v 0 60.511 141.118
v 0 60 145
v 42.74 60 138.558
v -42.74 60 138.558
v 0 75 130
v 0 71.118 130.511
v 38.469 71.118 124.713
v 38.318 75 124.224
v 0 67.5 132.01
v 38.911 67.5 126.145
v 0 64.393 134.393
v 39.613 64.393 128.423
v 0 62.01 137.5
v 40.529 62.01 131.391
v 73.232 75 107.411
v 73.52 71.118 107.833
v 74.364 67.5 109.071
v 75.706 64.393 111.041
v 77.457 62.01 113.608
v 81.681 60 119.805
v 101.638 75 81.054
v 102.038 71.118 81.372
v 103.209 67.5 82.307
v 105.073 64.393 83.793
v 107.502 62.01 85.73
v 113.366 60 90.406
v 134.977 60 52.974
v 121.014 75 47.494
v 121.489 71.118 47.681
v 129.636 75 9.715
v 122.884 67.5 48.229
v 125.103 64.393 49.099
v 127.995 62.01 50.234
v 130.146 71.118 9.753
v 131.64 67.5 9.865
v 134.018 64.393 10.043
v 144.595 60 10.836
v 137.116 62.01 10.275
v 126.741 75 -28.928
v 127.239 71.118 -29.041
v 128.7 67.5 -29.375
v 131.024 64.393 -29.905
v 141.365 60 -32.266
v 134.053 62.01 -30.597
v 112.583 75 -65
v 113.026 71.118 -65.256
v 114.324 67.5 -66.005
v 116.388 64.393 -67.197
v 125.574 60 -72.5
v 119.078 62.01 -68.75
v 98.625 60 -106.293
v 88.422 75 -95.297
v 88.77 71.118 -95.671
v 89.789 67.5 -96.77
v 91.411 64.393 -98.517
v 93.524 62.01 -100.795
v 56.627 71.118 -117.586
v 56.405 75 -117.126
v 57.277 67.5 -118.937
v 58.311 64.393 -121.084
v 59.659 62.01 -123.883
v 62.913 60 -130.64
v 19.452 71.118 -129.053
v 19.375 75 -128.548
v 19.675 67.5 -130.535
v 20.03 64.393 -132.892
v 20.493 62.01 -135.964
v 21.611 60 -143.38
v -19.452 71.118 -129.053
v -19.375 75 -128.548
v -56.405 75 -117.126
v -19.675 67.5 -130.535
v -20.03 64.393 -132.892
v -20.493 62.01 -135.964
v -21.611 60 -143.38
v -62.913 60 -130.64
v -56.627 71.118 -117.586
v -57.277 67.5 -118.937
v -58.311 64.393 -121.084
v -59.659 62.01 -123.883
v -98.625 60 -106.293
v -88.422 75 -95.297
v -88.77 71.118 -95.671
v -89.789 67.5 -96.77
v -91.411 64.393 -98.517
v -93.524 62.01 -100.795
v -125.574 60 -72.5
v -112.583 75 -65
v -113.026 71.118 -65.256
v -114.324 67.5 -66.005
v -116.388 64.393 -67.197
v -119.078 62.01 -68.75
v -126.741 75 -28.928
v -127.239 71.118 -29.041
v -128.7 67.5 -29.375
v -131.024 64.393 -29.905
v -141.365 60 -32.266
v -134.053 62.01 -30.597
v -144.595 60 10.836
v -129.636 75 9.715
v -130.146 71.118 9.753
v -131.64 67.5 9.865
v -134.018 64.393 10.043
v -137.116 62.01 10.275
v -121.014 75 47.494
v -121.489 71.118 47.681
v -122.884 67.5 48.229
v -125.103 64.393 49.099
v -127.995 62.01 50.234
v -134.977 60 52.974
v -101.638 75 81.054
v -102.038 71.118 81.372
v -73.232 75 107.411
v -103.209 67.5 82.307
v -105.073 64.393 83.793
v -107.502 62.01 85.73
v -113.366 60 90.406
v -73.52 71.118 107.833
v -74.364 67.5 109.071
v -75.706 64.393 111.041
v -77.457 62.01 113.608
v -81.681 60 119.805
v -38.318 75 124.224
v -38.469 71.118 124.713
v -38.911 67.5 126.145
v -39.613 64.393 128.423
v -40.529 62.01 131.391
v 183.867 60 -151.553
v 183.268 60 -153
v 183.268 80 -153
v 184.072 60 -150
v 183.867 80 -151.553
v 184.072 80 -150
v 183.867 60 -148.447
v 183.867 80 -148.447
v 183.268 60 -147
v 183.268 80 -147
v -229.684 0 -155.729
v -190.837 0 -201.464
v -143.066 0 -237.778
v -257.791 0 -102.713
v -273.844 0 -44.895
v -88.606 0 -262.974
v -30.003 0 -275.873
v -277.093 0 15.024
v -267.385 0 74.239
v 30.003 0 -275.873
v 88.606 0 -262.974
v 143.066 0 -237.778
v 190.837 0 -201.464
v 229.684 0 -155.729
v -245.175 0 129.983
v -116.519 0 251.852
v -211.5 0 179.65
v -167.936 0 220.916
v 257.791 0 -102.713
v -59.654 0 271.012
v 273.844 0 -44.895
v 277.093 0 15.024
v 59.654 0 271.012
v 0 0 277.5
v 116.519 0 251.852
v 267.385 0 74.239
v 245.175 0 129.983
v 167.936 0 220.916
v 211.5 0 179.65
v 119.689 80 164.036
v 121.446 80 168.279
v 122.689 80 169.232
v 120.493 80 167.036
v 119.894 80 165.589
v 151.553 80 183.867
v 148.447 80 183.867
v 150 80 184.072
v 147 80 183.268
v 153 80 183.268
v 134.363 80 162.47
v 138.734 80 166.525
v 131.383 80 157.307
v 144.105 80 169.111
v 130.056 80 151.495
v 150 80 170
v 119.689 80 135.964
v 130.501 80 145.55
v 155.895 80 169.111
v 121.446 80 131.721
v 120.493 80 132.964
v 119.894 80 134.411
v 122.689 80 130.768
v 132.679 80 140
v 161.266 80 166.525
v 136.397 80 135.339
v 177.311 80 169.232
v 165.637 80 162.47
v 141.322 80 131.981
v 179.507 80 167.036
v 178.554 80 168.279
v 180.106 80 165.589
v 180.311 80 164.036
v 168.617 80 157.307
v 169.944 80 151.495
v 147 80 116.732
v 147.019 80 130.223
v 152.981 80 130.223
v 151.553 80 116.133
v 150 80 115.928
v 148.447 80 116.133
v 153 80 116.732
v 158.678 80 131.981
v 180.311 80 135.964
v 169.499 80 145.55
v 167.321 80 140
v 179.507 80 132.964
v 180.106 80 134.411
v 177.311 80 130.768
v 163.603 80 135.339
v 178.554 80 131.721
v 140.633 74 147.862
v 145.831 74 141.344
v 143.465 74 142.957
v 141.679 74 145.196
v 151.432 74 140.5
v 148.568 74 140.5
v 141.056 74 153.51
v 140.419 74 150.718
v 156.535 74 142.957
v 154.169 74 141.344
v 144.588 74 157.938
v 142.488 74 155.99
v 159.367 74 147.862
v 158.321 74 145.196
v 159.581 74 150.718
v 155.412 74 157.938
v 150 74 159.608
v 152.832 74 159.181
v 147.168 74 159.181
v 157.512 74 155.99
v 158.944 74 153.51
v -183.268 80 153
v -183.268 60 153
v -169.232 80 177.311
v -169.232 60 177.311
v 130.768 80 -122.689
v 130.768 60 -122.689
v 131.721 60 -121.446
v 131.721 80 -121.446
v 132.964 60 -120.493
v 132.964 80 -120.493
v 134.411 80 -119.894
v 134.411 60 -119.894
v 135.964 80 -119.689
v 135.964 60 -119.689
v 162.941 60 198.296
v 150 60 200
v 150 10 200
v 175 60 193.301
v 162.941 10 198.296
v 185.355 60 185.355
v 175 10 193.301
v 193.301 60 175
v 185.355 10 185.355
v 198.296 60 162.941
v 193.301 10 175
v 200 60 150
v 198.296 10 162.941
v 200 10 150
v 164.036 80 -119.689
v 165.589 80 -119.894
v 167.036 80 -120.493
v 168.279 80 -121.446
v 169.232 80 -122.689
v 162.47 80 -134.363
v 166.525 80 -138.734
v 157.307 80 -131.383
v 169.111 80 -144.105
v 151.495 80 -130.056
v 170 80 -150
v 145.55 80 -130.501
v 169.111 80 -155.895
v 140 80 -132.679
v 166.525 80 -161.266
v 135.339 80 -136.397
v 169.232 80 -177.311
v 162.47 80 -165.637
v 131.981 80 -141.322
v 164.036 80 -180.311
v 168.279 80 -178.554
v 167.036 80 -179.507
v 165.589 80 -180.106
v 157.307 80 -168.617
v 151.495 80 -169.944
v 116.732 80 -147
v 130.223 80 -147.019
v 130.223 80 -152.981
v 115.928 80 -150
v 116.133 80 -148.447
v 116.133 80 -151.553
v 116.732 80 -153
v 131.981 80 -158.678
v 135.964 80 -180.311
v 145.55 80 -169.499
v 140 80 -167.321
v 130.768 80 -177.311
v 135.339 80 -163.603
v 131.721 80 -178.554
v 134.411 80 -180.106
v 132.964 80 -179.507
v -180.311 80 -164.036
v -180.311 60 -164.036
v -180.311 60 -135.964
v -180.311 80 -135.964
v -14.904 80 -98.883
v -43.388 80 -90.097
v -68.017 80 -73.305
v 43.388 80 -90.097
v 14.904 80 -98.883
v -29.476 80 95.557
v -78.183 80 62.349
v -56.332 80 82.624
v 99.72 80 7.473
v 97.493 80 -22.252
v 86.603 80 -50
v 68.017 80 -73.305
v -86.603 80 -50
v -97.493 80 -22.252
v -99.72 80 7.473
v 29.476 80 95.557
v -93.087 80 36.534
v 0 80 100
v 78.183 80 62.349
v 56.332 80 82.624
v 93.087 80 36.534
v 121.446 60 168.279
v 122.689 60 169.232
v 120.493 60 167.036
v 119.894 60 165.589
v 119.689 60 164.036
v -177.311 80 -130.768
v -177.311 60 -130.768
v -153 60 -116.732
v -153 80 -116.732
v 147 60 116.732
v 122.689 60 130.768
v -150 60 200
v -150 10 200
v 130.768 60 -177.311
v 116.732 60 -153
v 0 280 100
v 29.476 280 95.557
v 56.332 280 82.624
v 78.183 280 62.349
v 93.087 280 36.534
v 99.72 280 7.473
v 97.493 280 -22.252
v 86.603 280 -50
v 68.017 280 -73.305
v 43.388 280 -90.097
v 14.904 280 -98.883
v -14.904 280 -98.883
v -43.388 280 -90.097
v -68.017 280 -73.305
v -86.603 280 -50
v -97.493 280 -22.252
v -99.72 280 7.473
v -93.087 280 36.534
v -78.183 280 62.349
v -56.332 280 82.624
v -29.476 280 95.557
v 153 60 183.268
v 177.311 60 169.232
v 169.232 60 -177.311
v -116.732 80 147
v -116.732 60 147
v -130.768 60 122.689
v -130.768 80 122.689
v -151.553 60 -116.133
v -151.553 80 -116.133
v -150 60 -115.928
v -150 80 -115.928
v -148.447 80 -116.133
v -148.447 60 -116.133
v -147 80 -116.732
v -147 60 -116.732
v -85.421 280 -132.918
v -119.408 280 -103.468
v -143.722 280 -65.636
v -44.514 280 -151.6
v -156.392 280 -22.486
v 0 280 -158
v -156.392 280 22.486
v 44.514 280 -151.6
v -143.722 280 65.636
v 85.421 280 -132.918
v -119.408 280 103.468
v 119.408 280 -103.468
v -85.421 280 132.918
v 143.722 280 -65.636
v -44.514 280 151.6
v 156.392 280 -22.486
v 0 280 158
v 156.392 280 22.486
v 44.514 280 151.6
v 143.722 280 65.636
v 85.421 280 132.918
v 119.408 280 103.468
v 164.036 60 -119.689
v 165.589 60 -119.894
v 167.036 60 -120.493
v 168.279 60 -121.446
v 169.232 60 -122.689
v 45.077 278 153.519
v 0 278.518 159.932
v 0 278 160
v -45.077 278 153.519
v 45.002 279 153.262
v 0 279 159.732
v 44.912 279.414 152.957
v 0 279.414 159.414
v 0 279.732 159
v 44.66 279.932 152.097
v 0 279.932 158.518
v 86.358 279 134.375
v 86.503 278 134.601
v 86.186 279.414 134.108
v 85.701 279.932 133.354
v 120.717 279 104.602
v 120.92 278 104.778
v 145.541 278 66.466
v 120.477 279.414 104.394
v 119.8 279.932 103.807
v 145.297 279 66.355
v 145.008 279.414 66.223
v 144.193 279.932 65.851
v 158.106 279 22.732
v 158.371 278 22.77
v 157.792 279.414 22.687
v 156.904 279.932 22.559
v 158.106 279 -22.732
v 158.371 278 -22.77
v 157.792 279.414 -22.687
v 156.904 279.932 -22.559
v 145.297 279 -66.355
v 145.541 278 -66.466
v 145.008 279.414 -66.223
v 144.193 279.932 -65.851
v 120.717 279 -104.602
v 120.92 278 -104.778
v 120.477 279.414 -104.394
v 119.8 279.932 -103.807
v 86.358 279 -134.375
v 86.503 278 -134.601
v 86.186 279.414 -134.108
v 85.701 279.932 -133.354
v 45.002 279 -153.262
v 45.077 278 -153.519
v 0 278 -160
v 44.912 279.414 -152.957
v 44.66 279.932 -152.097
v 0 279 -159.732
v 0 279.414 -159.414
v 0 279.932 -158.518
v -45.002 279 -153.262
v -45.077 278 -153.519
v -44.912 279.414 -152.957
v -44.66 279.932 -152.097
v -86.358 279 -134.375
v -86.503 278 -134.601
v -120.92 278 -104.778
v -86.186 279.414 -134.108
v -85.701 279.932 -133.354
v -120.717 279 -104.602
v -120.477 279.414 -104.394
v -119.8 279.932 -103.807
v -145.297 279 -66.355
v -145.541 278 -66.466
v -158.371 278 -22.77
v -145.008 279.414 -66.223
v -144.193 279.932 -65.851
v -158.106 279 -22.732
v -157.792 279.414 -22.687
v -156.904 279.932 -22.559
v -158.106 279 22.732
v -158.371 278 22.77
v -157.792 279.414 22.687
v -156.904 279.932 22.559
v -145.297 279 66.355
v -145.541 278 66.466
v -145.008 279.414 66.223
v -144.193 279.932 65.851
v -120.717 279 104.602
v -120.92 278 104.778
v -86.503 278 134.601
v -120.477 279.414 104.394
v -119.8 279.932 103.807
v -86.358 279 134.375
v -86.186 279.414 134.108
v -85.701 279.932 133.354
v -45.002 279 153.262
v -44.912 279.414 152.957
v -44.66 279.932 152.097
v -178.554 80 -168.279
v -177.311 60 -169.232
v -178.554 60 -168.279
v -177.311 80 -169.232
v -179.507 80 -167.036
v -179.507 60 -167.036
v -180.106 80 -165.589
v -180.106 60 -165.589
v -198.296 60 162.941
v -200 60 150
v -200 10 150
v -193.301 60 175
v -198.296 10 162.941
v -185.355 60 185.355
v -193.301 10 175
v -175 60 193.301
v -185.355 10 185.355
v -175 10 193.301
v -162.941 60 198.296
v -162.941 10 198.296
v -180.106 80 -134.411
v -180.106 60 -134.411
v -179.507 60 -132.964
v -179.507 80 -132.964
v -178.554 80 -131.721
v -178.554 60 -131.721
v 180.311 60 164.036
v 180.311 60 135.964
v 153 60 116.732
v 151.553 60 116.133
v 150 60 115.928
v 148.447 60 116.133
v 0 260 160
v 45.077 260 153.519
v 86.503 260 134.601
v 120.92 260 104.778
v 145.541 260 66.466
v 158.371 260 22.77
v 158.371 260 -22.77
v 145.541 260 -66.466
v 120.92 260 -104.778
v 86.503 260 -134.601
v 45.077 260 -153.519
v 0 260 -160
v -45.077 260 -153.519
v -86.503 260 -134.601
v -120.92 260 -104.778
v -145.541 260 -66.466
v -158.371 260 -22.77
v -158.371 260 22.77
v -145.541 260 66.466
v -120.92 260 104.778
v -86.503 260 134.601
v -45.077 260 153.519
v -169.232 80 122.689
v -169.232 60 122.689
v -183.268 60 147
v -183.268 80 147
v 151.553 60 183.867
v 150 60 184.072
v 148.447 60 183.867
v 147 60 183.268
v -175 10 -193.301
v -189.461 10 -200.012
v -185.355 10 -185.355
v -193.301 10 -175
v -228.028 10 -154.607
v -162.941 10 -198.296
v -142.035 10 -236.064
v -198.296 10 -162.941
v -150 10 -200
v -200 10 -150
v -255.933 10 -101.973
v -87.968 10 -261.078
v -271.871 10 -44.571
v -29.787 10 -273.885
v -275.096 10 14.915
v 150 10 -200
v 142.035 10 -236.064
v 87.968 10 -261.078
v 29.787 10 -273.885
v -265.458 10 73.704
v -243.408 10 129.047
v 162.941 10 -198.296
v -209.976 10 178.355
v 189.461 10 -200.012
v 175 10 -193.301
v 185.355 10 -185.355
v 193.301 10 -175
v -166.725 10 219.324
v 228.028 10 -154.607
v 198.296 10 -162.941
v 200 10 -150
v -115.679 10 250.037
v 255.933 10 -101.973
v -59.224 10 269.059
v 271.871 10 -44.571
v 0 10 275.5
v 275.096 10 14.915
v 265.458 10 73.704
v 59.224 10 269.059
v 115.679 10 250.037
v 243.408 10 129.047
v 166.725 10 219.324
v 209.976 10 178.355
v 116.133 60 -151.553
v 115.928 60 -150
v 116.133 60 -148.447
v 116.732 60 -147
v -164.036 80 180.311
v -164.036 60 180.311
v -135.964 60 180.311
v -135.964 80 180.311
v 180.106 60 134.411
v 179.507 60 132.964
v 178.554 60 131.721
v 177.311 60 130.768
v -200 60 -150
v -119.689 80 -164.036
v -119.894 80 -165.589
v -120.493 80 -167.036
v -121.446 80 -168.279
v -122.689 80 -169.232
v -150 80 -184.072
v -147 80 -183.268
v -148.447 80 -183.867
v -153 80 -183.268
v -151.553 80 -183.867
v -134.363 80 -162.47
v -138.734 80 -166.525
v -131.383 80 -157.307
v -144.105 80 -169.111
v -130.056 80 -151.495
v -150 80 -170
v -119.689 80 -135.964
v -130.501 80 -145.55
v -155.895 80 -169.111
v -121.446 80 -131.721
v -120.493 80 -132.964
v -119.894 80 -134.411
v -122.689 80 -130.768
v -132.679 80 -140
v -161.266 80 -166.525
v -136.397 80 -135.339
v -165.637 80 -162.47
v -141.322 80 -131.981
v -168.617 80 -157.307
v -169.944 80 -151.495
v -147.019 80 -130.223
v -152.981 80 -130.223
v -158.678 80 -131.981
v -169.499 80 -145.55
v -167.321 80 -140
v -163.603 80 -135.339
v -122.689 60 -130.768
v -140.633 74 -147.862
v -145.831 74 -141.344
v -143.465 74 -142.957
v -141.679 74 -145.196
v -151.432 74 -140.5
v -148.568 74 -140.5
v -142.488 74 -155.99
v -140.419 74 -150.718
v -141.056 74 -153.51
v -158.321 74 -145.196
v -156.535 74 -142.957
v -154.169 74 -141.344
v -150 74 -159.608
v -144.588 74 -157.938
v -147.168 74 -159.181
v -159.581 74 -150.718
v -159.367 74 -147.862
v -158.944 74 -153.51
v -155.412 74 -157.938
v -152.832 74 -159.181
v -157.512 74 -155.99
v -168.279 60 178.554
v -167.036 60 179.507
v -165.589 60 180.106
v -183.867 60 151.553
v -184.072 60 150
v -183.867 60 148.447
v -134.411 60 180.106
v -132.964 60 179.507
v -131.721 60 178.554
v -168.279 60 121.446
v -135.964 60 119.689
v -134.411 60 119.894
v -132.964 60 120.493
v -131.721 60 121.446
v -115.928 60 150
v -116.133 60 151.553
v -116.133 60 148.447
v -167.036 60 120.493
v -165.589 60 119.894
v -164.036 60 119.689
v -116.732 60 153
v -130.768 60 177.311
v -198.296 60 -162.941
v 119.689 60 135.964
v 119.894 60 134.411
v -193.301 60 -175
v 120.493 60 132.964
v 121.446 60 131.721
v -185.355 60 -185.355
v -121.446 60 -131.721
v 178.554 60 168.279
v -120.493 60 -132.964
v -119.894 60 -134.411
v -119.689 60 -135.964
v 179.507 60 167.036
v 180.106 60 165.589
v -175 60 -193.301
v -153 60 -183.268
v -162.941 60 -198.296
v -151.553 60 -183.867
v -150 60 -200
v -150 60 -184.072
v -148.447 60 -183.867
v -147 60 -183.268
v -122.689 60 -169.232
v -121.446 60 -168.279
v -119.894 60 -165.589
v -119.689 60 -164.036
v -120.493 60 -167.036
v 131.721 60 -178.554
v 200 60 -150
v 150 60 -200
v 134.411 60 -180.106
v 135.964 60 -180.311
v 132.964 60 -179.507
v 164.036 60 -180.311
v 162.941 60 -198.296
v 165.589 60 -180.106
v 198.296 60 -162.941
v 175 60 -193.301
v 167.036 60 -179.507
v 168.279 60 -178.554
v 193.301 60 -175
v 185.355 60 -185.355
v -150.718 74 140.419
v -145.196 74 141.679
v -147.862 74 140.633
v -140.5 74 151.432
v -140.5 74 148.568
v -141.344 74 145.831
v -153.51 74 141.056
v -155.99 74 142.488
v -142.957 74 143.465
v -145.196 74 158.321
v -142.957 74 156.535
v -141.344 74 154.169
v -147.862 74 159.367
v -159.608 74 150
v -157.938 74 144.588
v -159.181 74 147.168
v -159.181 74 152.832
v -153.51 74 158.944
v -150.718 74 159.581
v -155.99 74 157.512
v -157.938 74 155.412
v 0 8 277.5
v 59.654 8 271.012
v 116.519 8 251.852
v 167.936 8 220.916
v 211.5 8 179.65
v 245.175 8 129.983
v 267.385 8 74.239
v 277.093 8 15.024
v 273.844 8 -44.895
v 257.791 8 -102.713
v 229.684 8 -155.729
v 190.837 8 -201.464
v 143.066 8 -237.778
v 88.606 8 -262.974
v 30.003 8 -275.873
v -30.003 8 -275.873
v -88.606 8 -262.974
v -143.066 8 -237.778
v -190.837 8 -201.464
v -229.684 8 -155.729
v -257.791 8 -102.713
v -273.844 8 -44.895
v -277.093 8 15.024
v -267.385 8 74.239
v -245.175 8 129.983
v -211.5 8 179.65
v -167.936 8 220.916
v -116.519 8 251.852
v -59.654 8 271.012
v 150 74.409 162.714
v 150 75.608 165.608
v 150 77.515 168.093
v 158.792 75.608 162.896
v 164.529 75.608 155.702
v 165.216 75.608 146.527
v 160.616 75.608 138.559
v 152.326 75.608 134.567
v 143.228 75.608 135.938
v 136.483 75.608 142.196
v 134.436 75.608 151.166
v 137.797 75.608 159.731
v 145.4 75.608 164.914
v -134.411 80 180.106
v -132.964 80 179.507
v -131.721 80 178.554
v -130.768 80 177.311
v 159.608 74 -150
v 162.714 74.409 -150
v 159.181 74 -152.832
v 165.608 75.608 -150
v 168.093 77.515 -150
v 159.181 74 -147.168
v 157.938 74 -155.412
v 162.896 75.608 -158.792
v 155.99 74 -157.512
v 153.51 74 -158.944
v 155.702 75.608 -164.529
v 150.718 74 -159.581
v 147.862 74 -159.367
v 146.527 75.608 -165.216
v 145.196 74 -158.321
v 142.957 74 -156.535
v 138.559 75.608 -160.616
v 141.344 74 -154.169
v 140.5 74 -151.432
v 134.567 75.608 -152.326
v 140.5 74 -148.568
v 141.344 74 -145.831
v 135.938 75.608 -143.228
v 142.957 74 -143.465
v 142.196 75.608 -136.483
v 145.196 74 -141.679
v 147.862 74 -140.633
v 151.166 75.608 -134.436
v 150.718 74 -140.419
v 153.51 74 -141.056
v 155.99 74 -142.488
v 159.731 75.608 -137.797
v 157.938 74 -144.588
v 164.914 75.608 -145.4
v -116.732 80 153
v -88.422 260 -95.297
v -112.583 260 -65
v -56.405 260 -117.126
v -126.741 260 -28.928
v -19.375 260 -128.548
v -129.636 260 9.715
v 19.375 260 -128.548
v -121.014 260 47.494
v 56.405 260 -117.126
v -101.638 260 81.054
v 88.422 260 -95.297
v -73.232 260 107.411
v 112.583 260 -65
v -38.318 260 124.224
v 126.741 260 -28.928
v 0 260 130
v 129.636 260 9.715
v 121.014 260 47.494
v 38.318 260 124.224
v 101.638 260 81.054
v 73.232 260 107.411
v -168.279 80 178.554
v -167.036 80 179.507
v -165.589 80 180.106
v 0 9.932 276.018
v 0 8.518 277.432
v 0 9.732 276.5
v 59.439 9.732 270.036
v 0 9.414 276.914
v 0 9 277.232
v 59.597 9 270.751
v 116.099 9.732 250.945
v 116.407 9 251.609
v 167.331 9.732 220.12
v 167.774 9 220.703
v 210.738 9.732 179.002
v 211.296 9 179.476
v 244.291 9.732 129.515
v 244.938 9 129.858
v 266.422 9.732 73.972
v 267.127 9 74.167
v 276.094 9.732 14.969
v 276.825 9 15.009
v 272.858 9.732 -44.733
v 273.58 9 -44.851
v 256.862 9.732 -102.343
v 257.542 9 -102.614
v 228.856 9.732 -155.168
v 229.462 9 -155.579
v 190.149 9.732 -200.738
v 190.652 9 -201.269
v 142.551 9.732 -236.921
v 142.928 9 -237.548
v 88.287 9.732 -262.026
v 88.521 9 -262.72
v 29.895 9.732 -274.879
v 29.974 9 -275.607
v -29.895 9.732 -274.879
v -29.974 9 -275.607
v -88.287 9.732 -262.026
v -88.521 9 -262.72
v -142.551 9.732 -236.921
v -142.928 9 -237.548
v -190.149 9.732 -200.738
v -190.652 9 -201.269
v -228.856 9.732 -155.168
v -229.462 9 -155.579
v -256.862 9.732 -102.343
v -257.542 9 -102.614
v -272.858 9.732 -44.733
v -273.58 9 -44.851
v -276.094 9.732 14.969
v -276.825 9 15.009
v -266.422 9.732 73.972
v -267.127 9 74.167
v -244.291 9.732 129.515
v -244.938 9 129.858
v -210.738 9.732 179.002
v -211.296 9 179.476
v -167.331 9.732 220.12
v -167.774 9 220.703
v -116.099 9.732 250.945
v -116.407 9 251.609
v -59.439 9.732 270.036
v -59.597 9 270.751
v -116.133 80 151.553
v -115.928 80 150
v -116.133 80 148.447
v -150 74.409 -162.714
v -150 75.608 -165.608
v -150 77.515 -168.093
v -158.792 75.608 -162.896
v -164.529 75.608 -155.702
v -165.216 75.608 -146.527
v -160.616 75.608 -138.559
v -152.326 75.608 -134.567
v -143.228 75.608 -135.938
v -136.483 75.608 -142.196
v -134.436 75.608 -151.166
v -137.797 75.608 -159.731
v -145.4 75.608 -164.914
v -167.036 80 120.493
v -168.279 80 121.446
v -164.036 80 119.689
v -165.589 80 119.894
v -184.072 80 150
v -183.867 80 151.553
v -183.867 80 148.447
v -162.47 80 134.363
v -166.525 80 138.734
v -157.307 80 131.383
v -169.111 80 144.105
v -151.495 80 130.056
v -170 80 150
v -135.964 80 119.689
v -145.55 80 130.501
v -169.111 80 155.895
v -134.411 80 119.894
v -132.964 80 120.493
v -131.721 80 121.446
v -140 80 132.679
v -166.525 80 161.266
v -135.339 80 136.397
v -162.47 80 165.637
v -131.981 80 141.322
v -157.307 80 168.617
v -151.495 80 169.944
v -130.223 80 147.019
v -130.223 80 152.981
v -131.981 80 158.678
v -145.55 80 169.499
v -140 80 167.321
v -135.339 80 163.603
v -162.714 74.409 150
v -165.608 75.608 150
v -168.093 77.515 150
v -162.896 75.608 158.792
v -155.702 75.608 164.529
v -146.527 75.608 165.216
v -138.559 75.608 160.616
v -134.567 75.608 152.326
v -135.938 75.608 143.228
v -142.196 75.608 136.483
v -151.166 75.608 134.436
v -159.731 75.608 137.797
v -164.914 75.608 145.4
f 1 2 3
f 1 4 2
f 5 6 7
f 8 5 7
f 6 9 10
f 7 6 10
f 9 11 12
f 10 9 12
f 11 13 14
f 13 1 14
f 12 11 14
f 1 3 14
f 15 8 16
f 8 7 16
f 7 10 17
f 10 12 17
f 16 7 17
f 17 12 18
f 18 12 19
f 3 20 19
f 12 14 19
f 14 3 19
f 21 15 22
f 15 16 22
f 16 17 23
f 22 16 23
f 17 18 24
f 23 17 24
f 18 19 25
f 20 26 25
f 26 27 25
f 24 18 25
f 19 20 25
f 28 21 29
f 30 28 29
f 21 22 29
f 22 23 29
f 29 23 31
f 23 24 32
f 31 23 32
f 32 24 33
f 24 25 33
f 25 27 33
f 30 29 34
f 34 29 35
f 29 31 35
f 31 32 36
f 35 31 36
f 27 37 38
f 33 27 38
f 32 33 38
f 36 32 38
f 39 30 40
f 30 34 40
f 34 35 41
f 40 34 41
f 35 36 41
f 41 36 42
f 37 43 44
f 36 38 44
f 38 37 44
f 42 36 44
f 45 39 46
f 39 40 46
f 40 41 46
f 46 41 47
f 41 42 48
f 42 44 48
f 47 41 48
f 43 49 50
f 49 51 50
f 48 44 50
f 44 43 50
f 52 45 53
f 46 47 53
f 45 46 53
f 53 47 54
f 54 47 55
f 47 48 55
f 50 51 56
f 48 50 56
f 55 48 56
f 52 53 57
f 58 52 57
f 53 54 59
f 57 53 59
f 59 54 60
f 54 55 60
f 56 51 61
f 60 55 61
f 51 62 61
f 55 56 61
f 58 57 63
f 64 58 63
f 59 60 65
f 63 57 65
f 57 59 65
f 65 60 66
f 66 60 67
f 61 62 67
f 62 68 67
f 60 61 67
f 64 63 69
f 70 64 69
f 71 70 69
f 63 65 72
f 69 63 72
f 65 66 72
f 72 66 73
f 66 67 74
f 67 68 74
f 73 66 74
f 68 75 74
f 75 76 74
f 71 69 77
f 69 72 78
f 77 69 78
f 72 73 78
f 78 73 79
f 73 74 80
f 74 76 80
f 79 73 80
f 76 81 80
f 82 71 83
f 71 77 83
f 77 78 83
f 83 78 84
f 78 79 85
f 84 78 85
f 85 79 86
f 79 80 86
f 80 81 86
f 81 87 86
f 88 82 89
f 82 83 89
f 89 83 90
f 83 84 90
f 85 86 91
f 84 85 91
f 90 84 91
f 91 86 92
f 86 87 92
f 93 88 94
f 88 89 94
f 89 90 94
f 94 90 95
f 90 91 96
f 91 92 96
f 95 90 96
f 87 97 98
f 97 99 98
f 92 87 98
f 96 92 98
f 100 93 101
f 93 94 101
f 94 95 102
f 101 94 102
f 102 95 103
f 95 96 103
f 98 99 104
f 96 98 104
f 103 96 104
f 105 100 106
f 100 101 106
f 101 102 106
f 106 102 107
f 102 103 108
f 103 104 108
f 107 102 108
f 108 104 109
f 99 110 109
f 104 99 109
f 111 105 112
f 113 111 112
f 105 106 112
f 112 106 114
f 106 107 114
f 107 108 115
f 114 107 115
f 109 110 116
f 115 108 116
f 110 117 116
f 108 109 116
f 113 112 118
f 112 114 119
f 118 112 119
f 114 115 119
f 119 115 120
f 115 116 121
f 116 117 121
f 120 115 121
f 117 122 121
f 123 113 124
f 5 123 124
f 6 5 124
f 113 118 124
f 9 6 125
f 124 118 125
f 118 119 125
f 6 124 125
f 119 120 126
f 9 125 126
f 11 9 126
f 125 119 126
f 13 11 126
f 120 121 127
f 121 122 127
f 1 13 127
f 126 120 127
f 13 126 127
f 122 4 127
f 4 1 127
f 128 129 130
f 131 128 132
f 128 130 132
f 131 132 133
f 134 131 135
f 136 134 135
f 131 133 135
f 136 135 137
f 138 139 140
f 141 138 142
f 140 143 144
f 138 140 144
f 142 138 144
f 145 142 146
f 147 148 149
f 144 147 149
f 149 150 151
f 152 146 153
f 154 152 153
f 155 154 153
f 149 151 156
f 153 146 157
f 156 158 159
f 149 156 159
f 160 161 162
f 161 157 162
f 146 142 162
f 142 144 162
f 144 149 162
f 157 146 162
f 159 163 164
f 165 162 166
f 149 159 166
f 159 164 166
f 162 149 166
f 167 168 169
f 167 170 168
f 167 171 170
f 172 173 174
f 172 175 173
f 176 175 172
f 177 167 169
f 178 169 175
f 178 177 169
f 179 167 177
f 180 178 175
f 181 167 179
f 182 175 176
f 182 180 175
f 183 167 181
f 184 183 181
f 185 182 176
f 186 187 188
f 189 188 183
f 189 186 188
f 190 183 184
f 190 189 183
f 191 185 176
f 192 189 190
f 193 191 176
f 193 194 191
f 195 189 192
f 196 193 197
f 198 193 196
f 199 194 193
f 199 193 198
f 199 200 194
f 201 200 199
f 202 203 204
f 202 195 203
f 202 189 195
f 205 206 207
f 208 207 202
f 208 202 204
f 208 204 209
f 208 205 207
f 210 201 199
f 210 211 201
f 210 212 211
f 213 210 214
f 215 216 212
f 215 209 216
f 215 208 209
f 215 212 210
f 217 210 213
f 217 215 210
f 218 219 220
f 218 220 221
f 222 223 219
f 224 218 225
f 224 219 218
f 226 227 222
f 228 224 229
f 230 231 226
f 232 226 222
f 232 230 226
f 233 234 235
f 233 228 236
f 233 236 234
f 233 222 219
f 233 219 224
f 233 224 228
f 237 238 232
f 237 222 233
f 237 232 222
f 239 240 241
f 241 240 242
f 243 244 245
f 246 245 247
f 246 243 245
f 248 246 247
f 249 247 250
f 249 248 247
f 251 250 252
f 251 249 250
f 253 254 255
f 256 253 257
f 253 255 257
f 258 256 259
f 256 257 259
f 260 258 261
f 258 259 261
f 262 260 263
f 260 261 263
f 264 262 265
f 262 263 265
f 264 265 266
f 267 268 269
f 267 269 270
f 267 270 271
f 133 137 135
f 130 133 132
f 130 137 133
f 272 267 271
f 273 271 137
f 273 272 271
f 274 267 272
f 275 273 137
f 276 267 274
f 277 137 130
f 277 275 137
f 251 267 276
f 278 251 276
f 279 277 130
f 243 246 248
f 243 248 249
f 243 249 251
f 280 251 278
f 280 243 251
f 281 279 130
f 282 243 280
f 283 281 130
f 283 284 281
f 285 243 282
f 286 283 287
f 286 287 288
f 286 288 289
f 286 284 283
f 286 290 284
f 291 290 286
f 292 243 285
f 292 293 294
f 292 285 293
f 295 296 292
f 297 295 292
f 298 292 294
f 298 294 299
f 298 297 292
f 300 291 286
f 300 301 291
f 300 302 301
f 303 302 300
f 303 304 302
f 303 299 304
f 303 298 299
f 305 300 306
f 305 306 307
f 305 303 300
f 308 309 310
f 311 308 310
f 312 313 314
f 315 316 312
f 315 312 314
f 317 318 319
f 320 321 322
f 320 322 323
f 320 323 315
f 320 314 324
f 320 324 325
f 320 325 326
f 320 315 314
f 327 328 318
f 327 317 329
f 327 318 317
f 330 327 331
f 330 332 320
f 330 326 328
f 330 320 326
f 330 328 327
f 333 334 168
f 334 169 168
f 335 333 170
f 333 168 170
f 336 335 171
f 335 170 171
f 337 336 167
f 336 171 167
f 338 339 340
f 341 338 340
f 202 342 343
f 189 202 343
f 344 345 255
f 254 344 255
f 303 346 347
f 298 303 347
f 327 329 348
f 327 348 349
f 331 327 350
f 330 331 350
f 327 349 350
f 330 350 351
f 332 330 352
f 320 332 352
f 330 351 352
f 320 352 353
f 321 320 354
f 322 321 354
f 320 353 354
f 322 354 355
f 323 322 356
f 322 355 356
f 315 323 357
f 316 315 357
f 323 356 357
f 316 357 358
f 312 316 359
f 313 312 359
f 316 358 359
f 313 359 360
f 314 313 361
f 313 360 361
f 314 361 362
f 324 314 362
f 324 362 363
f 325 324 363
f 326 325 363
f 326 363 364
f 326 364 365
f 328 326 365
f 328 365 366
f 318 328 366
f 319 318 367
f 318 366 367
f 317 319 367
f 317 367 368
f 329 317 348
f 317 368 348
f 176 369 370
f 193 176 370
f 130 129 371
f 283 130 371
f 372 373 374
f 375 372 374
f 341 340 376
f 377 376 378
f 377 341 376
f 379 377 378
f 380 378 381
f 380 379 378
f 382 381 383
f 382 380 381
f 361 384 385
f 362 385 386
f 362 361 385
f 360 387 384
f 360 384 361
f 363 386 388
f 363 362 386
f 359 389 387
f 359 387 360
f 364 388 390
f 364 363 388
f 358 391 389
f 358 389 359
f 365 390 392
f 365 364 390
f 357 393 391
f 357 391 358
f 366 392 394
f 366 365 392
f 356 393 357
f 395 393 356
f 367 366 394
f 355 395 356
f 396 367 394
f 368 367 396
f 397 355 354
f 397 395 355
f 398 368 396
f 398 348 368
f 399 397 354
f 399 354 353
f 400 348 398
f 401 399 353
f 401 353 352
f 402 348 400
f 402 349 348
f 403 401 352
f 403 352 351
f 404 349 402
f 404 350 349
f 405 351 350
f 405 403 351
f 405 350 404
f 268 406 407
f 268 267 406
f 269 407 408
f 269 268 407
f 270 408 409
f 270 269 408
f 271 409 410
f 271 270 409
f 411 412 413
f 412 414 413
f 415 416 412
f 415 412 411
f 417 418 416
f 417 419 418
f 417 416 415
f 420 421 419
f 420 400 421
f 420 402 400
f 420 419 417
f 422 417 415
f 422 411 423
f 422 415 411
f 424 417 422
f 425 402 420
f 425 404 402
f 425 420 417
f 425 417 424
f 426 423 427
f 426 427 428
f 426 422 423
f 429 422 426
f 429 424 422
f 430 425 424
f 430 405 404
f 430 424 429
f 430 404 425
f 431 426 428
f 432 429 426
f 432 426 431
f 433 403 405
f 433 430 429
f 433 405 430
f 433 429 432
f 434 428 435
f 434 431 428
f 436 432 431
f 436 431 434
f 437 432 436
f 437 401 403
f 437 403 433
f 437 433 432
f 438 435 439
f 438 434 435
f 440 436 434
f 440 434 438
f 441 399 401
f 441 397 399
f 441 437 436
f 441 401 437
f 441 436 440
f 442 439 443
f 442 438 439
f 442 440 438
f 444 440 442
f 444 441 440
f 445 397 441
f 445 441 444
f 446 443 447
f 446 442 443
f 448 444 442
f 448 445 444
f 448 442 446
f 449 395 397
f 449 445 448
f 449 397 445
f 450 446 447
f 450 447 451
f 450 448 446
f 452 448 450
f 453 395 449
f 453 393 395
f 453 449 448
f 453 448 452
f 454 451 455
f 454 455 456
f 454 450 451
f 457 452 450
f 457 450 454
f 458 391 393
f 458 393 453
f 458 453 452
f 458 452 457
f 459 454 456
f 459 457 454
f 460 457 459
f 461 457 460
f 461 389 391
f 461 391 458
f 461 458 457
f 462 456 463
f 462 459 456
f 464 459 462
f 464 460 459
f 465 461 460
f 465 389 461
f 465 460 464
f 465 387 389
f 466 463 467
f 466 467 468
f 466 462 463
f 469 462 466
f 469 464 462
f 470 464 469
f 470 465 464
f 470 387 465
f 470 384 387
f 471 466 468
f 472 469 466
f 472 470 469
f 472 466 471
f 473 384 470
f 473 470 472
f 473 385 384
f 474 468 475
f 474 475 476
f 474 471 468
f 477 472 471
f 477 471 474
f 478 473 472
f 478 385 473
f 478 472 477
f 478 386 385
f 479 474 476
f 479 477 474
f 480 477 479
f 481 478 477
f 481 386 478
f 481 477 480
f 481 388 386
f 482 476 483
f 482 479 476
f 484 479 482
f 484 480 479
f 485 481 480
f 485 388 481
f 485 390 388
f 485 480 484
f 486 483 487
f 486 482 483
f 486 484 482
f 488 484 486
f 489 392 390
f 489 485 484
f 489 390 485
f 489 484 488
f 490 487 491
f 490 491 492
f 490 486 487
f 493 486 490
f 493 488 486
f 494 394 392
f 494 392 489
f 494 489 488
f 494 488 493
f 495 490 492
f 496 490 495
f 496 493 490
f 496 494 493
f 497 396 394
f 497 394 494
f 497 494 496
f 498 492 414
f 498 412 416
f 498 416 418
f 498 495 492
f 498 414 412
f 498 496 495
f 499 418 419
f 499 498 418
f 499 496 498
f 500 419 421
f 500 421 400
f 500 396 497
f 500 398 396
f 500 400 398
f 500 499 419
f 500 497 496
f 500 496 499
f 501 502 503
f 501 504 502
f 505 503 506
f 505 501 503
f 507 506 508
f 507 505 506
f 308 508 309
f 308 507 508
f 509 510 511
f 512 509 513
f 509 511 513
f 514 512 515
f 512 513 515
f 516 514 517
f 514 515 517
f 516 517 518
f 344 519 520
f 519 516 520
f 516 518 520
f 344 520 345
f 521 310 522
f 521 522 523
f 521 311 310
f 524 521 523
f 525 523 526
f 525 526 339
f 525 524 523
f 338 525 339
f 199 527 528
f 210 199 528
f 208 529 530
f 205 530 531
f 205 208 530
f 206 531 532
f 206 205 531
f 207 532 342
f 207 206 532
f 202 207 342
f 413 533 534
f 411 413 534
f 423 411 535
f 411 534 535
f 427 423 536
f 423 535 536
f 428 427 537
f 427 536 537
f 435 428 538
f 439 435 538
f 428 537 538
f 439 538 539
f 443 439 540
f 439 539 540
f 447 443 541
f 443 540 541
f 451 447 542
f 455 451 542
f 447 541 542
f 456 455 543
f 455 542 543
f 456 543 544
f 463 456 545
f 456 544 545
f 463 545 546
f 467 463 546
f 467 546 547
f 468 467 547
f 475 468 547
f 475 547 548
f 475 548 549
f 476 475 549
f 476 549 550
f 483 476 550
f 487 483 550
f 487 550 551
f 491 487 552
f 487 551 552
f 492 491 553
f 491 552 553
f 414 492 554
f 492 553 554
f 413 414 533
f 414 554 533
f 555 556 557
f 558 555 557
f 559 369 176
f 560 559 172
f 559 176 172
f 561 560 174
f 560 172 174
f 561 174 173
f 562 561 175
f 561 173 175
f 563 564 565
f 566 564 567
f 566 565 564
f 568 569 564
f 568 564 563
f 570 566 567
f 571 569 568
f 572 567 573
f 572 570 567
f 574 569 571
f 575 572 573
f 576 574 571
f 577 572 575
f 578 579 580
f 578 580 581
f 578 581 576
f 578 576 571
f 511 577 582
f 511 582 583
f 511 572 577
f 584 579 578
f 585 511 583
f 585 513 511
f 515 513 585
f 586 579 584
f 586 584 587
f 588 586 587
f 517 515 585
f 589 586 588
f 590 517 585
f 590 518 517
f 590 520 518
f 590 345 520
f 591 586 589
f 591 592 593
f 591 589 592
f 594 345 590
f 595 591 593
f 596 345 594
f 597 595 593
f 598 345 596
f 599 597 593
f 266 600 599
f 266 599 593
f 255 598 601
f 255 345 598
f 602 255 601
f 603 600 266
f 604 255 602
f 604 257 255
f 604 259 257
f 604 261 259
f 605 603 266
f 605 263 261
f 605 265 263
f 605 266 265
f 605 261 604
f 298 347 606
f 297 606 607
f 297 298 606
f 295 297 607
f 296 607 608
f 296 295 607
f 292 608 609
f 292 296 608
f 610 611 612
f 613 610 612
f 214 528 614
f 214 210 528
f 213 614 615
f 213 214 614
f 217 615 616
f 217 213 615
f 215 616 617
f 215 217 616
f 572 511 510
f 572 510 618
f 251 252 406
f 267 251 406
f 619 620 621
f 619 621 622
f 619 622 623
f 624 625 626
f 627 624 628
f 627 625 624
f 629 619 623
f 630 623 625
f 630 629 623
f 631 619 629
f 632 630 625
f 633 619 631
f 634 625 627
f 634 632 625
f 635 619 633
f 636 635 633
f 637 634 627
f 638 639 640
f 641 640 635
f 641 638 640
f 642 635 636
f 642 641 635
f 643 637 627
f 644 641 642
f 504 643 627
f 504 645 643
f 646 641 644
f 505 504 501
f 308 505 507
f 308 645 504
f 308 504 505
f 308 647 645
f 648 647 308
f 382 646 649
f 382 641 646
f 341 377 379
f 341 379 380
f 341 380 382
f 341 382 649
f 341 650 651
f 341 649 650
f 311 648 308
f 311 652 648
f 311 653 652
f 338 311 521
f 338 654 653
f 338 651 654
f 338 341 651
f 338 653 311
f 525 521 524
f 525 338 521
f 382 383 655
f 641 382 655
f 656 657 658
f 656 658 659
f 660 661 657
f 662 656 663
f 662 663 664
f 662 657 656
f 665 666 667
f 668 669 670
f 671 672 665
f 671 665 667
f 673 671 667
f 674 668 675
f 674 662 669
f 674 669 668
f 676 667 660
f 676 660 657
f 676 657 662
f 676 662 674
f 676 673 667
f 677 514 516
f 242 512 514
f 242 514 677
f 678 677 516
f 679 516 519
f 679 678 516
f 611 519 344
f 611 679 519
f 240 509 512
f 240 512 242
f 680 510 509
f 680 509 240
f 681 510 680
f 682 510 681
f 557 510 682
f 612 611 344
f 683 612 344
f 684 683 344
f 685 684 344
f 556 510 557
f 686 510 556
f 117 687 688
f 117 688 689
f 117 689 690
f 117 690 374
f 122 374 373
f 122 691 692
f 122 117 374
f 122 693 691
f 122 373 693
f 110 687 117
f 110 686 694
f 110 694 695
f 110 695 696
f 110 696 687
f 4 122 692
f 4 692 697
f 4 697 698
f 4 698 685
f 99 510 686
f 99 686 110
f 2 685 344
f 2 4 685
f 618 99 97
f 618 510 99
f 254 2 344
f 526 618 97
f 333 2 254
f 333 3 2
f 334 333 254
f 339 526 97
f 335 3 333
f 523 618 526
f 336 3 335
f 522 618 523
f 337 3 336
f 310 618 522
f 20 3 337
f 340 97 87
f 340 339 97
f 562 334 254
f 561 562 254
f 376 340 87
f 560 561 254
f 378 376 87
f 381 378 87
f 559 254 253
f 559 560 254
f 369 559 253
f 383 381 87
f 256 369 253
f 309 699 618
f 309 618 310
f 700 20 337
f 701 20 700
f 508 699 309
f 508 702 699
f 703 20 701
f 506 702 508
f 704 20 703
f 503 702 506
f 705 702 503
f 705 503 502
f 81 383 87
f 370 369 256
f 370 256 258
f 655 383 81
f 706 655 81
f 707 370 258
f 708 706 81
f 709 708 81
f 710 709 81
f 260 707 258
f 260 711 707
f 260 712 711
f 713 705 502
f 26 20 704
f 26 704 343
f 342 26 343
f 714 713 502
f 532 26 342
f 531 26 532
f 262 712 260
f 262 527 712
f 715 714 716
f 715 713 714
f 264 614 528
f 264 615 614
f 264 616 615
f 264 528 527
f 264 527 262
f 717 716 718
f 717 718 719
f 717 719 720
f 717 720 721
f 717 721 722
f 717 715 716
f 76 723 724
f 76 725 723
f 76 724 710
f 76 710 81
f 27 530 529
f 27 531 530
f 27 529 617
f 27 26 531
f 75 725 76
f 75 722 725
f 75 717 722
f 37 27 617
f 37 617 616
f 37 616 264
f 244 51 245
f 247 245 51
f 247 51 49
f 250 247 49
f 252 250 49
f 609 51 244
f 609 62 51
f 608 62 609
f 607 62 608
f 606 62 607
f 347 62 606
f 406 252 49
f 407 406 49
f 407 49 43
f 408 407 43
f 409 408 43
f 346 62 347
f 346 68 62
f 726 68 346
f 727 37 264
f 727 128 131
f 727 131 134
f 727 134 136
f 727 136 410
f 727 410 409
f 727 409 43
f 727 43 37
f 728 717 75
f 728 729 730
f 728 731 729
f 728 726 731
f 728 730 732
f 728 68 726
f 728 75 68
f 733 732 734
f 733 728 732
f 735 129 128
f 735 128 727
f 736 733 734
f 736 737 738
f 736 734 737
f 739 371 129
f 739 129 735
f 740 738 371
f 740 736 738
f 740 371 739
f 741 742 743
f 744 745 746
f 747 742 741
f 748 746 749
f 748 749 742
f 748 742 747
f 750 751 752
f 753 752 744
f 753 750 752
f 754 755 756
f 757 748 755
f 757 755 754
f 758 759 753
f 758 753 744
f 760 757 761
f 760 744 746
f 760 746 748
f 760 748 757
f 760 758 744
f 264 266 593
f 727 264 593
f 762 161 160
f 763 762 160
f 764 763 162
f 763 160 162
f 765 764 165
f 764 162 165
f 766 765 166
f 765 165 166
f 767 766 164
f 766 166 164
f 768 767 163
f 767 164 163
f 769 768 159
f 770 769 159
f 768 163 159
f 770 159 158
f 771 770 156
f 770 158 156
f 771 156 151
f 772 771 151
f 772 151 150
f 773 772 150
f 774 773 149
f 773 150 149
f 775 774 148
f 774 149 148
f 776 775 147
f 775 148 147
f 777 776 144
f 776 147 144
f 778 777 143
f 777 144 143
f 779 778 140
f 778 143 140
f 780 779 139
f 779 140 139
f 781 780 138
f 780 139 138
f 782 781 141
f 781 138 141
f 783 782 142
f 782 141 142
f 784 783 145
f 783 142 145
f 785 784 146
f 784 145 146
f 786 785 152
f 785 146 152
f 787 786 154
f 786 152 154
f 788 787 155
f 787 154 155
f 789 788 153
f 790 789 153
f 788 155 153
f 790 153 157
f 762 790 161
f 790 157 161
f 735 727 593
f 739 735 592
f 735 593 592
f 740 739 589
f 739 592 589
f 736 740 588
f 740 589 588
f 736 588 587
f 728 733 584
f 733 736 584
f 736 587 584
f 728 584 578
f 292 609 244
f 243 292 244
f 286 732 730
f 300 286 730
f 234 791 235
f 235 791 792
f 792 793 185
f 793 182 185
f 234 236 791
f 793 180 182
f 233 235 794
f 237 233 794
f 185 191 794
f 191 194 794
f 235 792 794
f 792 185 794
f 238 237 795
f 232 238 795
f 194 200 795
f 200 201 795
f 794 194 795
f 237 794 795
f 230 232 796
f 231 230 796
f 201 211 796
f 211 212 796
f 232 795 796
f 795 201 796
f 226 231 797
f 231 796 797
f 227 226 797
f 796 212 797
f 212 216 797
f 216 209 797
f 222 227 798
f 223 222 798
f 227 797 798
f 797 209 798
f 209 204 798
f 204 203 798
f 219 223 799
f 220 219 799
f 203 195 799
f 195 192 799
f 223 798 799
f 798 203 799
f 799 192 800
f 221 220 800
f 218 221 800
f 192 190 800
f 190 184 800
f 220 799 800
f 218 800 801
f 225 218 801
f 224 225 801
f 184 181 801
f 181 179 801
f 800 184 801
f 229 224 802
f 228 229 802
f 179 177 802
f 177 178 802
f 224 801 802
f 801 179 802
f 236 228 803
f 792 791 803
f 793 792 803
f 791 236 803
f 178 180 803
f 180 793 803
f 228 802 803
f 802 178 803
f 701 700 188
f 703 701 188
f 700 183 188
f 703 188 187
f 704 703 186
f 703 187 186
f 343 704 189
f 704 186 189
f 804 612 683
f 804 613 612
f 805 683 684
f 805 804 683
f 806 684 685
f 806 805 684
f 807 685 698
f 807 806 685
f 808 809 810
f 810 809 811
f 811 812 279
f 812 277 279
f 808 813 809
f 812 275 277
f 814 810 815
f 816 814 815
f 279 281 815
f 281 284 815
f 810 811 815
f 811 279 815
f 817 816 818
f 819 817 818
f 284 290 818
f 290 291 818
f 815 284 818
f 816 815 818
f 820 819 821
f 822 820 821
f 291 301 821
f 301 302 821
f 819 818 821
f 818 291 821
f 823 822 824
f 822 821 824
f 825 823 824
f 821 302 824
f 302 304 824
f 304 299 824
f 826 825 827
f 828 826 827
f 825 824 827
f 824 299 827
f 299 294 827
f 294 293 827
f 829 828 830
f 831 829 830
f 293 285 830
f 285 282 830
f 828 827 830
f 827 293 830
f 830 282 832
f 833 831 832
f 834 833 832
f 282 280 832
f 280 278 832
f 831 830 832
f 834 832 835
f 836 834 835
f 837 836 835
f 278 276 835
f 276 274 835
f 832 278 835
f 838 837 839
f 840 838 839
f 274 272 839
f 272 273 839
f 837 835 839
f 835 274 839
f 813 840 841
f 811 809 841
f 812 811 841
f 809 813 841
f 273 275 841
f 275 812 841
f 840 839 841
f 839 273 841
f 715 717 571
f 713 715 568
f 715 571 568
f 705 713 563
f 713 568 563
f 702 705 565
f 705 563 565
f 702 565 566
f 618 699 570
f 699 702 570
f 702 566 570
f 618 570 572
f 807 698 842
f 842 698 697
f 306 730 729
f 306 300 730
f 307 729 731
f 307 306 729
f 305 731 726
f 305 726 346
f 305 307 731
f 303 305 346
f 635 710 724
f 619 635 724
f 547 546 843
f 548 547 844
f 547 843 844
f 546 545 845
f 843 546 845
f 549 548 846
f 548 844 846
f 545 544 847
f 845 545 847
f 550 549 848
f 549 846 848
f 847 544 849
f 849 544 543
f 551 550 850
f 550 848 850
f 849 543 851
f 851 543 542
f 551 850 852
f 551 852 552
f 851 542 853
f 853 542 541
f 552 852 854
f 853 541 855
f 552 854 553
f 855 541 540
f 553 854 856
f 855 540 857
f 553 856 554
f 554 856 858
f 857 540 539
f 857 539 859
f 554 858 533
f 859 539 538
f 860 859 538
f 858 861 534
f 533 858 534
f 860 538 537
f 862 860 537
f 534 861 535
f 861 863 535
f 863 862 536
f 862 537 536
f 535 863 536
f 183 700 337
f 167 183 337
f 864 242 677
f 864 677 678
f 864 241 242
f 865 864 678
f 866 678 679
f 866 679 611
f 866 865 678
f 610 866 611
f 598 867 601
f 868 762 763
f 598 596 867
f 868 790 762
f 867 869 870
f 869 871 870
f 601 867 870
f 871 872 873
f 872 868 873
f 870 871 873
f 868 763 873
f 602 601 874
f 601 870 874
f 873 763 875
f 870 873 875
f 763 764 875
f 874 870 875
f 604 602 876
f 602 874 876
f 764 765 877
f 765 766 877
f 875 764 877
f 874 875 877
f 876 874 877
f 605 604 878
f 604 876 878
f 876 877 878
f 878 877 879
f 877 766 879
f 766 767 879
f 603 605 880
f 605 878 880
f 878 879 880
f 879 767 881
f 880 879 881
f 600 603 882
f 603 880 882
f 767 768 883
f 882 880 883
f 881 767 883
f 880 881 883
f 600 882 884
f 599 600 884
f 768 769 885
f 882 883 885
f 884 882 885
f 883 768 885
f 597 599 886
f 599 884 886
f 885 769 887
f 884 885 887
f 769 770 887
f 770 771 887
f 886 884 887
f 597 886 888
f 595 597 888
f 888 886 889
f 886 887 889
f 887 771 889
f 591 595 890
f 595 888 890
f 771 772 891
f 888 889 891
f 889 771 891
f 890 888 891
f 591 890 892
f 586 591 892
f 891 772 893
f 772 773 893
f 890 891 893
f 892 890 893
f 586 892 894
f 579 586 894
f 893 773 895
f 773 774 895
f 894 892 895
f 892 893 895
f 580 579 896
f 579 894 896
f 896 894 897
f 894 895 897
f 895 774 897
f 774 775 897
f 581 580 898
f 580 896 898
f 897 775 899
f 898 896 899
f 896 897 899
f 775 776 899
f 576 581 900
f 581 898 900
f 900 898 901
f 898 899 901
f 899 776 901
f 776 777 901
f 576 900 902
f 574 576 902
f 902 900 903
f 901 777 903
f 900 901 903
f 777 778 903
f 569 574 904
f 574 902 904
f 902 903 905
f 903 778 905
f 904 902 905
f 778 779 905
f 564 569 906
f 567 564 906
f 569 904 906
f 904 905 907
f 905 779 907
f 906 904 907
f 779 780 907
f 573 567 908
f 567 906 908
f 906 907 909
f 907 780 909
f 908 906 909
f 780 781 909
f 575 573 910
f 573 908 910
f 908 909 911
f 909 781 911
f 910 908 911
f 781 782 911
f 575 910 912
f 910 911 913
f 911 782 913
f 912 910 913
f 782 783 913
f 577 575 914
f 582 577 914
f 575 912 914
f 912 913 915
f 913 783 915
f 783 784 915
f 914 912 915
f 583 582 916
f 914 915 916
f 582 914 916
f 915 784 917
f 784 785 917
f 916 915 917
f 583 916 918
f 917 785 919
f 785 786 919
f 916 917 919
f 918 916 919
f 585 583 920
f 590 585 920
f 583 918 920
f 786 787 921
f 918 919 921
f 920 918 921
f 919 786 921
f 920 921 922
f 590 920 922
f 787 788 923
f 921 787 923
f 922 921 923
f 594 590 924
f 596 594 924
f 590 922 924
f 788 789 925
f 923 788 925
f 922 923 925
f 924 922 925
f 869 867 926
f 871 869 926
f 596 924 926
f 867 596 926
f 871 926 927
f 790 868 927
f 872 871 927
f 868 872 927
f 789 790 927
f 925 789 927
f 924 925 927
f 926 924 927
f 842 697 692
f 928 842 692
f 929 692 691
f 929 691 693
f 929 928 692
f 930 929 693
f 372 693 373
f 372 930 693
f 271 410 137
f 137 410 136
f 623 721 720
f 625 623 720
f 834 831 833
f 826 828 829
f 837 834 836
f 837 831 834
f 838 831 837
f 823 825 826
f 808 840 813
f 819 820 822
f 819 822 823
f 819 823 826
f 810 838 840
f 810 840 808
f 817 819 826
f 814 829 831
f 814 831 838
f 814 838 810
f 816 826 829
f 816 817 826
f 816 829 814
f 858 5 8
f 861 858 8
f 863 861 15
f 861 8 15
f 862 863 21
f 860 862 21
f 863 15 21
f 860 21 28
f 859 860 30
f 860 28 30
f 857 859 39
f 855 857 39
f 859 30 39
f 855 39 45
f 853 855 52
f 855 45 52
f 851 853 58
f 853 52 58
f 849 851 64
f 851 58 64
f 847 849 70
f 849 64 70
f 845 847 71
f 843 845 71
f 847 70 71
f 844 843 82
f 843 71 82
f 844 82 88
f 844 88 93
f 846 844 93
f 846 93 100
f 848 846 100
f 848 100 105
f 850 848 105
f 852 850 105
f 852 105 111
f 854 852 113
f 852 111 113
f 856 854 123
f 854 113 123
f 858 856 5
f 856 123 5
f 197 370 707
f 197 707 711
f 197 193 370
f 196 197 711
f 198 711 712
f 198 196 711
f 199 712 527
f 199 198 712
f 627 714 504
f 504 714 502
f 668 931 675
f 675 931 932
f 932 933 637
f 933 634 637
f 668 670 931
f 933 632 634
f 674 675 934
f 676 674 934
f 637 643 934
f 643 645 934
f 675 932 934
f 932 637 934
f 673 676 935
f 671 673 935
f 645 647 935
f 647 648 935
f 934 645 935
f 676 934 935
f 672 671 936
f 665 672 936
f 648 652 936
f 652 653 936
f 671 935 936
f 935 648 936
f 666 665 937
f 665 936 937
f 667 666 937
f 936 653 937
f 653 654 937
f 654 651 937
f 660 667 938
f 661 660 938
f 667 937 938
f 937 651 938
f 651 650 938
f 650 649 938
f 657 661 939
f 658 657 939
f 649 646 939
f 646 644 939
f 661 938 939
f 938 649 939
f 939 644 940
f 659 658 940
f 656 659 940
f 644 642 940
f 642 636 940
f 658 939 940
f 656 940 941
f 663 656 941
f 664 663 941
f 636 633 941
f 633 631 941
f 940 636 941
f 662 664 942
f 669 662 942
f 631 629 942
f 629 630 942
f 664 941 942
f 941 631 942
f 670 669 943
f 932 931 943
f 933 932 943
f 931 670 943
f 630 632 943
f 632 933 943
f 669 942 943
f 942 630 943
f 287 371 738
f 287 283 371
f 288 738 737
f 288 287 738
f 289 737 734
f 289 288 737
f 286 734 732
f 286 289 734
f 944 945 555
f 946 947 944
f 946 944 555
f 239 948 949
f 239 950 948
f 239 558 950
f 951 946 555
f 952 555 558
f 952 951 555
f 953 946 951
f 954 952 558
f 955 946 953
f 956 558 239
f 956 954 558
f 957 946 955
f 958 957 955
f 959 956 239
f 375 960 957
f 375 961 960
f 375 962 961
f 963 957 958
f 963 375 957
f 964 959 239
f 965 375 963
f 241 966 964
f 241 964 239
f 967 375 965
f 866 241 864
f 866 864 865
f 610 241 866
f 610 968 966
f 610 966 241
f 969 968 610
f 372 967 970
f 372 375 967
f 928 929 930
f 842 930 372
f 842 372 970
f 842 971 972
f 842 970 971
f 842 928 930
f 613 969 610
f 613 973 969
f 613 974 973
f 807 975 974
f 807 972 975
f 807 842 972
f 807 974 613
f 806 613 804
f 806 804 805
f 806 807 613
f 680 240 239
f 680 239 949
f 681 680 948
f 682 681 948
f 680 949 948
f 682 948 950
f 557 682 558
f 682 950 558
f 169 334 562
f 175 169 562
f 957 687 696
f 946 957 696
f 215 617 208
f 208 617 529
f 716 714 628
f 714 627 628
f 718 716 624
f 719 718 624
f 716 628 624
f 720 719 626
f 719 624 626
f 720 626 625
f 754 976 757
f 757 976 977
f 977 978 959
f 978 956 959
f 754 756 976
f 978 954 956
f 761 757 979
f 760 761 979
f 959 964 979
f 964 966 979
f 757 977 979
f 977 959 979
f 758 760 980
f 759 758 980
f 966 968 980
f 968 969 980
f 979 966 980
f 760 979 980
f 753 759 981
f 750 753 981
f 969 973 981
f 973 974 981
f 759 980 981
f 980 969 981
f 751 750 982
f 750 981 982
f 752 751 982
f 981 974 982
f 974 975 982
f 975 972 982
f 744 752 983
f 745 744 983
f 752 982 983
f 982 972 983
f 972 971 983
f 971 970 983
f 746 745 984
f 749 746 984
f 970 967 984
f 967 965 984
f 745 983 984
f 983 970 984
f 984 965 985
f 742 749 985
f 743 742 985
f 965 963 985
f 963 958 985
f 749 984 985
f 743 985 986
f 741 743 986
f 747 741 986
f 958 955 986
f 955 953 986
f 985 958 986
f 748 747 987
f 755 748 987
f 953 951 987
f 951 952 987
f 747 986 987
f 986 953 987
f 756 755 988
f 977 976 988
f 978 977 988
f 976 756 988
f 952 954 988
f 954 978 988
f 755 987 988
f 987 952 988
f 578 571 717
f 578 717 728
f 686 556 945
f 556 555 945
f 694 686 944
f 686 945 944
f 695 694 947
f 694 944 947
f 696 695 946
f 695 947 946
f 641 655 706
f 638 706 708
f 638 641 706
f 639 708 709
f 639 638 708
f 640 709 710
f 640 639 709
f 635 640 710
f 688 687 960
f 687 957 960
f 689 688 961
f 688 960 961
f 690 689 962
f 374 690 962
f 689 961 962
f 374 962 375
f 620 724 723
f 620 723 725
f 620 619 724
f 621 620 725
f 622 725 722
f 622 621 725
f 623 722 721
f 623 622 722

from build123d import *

# Parameters (mm, degrees)
SKETCH1_R                = 277.5
BOSS_EXTRUDE1_DEPTH      = 10
SKETCH2_W                = 400
SKETCH2_H                = 400
BOSS_EXTRUDE2_DEPTH      = 50
FILLET1_R                = 50
SKETCH3_R                = 130
BOSS_EXTRUDE3_DEPTH      = 200
SKETCH4_R                = 160
BOSS_EXTRUDE4_DEPTH      = 20
SKETCH7_R                = 100
CUT_EXTRUDE2_DEPTH       = 200
FILLET3_R                = 15
FILLET4_R                = 2
BOSS_EXTRUDE6_DEPTH      = 20
SKETCH9_R                = 20
CUT_EXTRUDE3_DEPTH       = 6
FILLET5_R                = 12
FILLET6_R                = 6
CIRPATTERN1_COUNT        = 4
FILLET5_OF_CIRPATTERN1_R = 12
FILLET6_OF_CIRPATTERN1_R = 6


with BuildPart() as part:
    # Sketch1 → Boss-Extrude1 (new body)
    with BuildSketch(Plane(origin=(0, 0, 0), x_dir=(1, 0, 0), z_dir=(0, 1, 0))):
        with Locations(Location((0, 0, 0), (0, 0, 270))):
            Circle(SKETCH1_R)
    extrude(amount=BOSS_EXTRUDE1_DEPTH)

    # Sketch2 → Boss-Extrude2 (add)
    with BuildSketch(Plane(origin=(0, 10, 0), x_dir=(1, 0, 0), z_dir=(0, 1, 0))):
        Rectangle(SKETCH2_W, SKETCH2_H)
    extrude(amount=BOSS_EXTRUDE2_DEPTH)

    # Fillet1
    # the kernel refuses this fillet: 50 mm, written as the material it takes off along each edge
    with BuildSketch(Plane(origin=(-200, 10, -200), x_dir=(0, 0, 1), z_dir=(0, 1, 0)), Plane(origin=(-200, 10, 200), x_dir=(1, 0, 0), z_dir=(0, 1, 0)), Plane(origin=(200, 10, -200), x_dir=(-1, 0, 0), z_dir=(0, 1, 0))) as fillet1_piece_1:
        with BuildLine():
            CenterArc((FILLET1_R, FILLET1_R), FILLET1_R, 180, 90)
            Line((0, FILLET1_R), (0, 0))
            Line((0, 0), (FILLET1_R, 0))
        make_face()
    extrude(amount=175, mode=Mode.SUBTRACT)
    with BuildSketch(Plane(origin=(200, 10, 200), x_dir=(-1, 0, 0), z_dir=(0, 1, 0))) as fillet1_piece_2:
        with BuildLine():
            CenterArc((FILLET1_R, -FILLET1_R), FILLET1_R, 90, 90)
            Line((0, -FILLET1_R), (0, 0))
            Line((0, 0), (FILLET1_R, 0))
        make_face()
    extrude(amount=175, mode=Mode.SUBTRACT)

    # Sketch3 → Boss-Extrude3 (add)
    with BuildSketch(Plane(origin=(0, 60, 0), x_dir=(1, 0, 0), z_dir=(0, 1, 0))):
        with Locations(Location((0, 0, 0), (0, 0, 270))):
            Circle(SKETCH3_R)
    extrude(amount=BOSS_EXTRUDE3_DEPTH)

    # Sketch4 → Boss-Extrude4 (add)
    with BuildSketch(Plane(origin=(0, 260, 0), x_dir=(1, 0, 0), z_dir=(0, 1, 0))):
        with Locations(Location((0, 0, 0), (0, 0, 270))):
            Circle(SKETCH4_R)
    extrude(amount=BOSS_EXTRUDE4_DEPTH)

    # Sketch7 → Cut-Extrude2 (cut)
    with BuildSketch(Plane(origin=(0, 280, 0), x_dir=(1, 0, 0), z_dir=(0, 1, 0))):
        with Locations(Location((0, 0, 0), (0, 0, 270))):
            Circle(SKETCH7_R)
    extrude(amount=-CUT_EXTRUDE2_DEPTH, mode=Mode.SUBTRACT)

    # Fillet3
    fillet3_edges = [part.edges().sort_by_distance(p)[0] for p in [
        (0, 60, -130),
    ]]
    fillet(fillet3_edges, radius=FILLET3_R)

    # Fillet4
    fillet4_edges = [part.edges().sort_by_distance(p)[0] for p in [
        (0, 10, -277.5),
        (0, 280, -160),
    ]]
    fillet(fillet4_edges, radius=FILLET4_R)

    # Sketch8 → Boss-Extrude6 (add)
    with BuildSketch(Plane(origin=(0, 60, 0), x_dir=(1, 0, 0), z_dir=(0, 1, 0))):
        Polygon((150, -185), (180.310889132, -167.5), (180.310889132, -132.5), (150, -115), (119.689110868, -132.5), (119.689110868, -167.5), align=None)
    boss_extrude6 = extrude(amount=BOSS_EXTRUDE6_DEPTH)

    # Sketch9 → Cut-Extrude3 (cut)
    with BuildSketch(Plane(origin=(0, 80, 0), x_dir=(1, 0, 0), z_dir=(0, 1, 0))):
        with Locations(Location((150, -150, 0), (0, 0, 270))):
            Circle(SKETCH9_R)
    cut_extrude3 = extrude(amount=-CUT_EXTRUDE3_DEPTH, mode=Mode.SUBTRACT)

    # Fillet5
    # the kernel refuses this fillet: 12 mm, written as the material it adds along each edge
    with BuildSketch(Plane(origin=(150, 74, 150), x_dir=(0, 0, 1), z_dir=(-1, 0, 0))) as fillet5_piece_1:
        with BuildLine():
            CenterArc((9.607695155, 12), FILLET5_R, 270, 60)
            Line((9.607695155, 0), (9.607695155, -0.24))
            Line((9.607695155, -0.24), (20, -0.24))
            Line((20, -0.24), (20.24, 0))
            ThreePointArc((20.24, 0), (20.24, 3), (20.207846097, 5.88))
            Line((20.207846097, 5.88), (20, 6))
        make_face()
    revolve(axis=Axis((150, 74, 150), (0, 1, 0)))

    # Fillet6
    fillet6_edges = [part.edges().sort_by_distance(p)[0] for p in [
        (119.689110868, 70, 167.5),
        (150, 70, 185),
        (180.310889132, 70, 167.5),
        (180.310889132, 70, 132.5),
        (150, 70, 115),
        (119.689110868, 70, 132.5),
    ]]
    fillet(fillet6_edges, radius=FILLET6_R)

    # CirPattern1: Boss-Extrude6, Cut-Extrude3 ×4 about axis
    cirpattern1_axis = Axis((0, 0, 0), (0, 1, 0))
    add([boss_extrude6.rotate(cirpattern1_axis, i * 360 / CIRPATTERN1_COUNT) for i in range(1, CIRPATTERN1_COUNT)])
    add([cut_extrude3.rotate(cirpattern1_axis, i * 360 / CIRPATTERN1_COUNT) for i in range(1, CIRPATTERN1_COUNT)], mode=Mode.SUBTRACT)

    # Fillet5 of CirPattern1
    # the kernel refuses this fillet: 12 mm, written as the material it adds along each edge
    with BuildSketch(Plane(origin=(150, 74, -150), x_dir=(1, 0, 0), z_dir=(0, 0, 1))) as fillet5_of_cirpattern1_piece_1:
        with BuildLine():
            CenterArc((9.607695155, 12), FILLET5_OF_CIRPATTERN1_R, 270, 60)
            Line((9.607695155, 0), (9.607695155, -0.24))
            Line((9.607695155, -0.24), (20, -0.24))
            Line((20, -0.24), (20.24, 0))
            ThreePointArc((20.24, 0), (20.24, 3), (20.207846097, 5.88))
            Line((20.207846097, 5.88), (20, 6))
        make_face()
    revolve(axis=Axis((150, 74, -150), (0, 1, 0)))
    with BuildSketch(Plane(origin=(-150, 74, -150), x_dir=(0, 0, -1), z_dir=(1, 0, 0))) as fillet5_of_cirpattern1_piece_2:
        with BuildLine():
            CenterArc((9.607695155, 12), FILLET5_OF_CIRPATTERN1_R, 270, 60)
            Line((9.607695155, 0), (9.607695155, -0.24))
            Line((9.607695155, -0.24), (20, -0.24))
            Line((20, -0.24), (20.24, 0))
            ThreePointArc((20.24, 0), (20.24, 3), (20.207846097, 5.88))
            Line((20.207846097, 5.88), (20, 6))
        make_face()
    revolve(axis=Axis((-150, 74, -150), (0, 1, 0)))
    with BuildSketch(Plane(origin=(-150, 74, 150), x_dir=(-1, 0, 0), z_dir=(0, 0, -1))) as fillet5_of_cirpattern1_piece_3:
        with BuildLine():
            CenterArc((9.607695155, 12), FILLET5_OF_CIRPATTERN1_R, 270, 60)
            Line((9.607695155, 0), (9.607695155, -0.24))
            Line((9.607695155, -0.24), (20, -0.24))
            Line((20, -0.24), (20.24, 0))
            ThreePointArc((20.24, 0), (20.24, 3), (20.207846097, 5.88))
            Line((20.207846097, 5.88), (20, 6))
        make_face()
    revolve(axis=Axis((-150, 74, 150), (0, 1, 0)))

    # Fillet6 of CirPattern1
    fillet6_of_cirpattern1_edges = [part.edges().sort_by_distance(p)[0] for p in [
        (167.5, 70, -119.689110868),
        (185, 70, -150),
        (167.5, 70, -180.310889132),
        (132.5, 70, -180.310889132),
        (115, 70, -150),
        (132.5, 70, -119.689110868),
        (-119.689110868, 70, -167.5),
        (-150, 70, -185),
        (-180.310889132, 70, -167.5),
        (-180.310889132, 70, -132.5),
        (-150, 70, -115),
        (-119.689110868, 70, -132.5),
        (-167.5, 70, 119.689110868),
        (-185, 70, 150),
        (-167.5, 70, 180.310889132),
        (-132.5, 70, 180.310889132),
        (-115, 70, 150),
        (-132.5, 70, 119.689110868),
    ]]
    fillet(fillet6_of_cirpattern1_edges, radius=FILLET6_OF_CIRPATTERN1_R)


solid = part.part
